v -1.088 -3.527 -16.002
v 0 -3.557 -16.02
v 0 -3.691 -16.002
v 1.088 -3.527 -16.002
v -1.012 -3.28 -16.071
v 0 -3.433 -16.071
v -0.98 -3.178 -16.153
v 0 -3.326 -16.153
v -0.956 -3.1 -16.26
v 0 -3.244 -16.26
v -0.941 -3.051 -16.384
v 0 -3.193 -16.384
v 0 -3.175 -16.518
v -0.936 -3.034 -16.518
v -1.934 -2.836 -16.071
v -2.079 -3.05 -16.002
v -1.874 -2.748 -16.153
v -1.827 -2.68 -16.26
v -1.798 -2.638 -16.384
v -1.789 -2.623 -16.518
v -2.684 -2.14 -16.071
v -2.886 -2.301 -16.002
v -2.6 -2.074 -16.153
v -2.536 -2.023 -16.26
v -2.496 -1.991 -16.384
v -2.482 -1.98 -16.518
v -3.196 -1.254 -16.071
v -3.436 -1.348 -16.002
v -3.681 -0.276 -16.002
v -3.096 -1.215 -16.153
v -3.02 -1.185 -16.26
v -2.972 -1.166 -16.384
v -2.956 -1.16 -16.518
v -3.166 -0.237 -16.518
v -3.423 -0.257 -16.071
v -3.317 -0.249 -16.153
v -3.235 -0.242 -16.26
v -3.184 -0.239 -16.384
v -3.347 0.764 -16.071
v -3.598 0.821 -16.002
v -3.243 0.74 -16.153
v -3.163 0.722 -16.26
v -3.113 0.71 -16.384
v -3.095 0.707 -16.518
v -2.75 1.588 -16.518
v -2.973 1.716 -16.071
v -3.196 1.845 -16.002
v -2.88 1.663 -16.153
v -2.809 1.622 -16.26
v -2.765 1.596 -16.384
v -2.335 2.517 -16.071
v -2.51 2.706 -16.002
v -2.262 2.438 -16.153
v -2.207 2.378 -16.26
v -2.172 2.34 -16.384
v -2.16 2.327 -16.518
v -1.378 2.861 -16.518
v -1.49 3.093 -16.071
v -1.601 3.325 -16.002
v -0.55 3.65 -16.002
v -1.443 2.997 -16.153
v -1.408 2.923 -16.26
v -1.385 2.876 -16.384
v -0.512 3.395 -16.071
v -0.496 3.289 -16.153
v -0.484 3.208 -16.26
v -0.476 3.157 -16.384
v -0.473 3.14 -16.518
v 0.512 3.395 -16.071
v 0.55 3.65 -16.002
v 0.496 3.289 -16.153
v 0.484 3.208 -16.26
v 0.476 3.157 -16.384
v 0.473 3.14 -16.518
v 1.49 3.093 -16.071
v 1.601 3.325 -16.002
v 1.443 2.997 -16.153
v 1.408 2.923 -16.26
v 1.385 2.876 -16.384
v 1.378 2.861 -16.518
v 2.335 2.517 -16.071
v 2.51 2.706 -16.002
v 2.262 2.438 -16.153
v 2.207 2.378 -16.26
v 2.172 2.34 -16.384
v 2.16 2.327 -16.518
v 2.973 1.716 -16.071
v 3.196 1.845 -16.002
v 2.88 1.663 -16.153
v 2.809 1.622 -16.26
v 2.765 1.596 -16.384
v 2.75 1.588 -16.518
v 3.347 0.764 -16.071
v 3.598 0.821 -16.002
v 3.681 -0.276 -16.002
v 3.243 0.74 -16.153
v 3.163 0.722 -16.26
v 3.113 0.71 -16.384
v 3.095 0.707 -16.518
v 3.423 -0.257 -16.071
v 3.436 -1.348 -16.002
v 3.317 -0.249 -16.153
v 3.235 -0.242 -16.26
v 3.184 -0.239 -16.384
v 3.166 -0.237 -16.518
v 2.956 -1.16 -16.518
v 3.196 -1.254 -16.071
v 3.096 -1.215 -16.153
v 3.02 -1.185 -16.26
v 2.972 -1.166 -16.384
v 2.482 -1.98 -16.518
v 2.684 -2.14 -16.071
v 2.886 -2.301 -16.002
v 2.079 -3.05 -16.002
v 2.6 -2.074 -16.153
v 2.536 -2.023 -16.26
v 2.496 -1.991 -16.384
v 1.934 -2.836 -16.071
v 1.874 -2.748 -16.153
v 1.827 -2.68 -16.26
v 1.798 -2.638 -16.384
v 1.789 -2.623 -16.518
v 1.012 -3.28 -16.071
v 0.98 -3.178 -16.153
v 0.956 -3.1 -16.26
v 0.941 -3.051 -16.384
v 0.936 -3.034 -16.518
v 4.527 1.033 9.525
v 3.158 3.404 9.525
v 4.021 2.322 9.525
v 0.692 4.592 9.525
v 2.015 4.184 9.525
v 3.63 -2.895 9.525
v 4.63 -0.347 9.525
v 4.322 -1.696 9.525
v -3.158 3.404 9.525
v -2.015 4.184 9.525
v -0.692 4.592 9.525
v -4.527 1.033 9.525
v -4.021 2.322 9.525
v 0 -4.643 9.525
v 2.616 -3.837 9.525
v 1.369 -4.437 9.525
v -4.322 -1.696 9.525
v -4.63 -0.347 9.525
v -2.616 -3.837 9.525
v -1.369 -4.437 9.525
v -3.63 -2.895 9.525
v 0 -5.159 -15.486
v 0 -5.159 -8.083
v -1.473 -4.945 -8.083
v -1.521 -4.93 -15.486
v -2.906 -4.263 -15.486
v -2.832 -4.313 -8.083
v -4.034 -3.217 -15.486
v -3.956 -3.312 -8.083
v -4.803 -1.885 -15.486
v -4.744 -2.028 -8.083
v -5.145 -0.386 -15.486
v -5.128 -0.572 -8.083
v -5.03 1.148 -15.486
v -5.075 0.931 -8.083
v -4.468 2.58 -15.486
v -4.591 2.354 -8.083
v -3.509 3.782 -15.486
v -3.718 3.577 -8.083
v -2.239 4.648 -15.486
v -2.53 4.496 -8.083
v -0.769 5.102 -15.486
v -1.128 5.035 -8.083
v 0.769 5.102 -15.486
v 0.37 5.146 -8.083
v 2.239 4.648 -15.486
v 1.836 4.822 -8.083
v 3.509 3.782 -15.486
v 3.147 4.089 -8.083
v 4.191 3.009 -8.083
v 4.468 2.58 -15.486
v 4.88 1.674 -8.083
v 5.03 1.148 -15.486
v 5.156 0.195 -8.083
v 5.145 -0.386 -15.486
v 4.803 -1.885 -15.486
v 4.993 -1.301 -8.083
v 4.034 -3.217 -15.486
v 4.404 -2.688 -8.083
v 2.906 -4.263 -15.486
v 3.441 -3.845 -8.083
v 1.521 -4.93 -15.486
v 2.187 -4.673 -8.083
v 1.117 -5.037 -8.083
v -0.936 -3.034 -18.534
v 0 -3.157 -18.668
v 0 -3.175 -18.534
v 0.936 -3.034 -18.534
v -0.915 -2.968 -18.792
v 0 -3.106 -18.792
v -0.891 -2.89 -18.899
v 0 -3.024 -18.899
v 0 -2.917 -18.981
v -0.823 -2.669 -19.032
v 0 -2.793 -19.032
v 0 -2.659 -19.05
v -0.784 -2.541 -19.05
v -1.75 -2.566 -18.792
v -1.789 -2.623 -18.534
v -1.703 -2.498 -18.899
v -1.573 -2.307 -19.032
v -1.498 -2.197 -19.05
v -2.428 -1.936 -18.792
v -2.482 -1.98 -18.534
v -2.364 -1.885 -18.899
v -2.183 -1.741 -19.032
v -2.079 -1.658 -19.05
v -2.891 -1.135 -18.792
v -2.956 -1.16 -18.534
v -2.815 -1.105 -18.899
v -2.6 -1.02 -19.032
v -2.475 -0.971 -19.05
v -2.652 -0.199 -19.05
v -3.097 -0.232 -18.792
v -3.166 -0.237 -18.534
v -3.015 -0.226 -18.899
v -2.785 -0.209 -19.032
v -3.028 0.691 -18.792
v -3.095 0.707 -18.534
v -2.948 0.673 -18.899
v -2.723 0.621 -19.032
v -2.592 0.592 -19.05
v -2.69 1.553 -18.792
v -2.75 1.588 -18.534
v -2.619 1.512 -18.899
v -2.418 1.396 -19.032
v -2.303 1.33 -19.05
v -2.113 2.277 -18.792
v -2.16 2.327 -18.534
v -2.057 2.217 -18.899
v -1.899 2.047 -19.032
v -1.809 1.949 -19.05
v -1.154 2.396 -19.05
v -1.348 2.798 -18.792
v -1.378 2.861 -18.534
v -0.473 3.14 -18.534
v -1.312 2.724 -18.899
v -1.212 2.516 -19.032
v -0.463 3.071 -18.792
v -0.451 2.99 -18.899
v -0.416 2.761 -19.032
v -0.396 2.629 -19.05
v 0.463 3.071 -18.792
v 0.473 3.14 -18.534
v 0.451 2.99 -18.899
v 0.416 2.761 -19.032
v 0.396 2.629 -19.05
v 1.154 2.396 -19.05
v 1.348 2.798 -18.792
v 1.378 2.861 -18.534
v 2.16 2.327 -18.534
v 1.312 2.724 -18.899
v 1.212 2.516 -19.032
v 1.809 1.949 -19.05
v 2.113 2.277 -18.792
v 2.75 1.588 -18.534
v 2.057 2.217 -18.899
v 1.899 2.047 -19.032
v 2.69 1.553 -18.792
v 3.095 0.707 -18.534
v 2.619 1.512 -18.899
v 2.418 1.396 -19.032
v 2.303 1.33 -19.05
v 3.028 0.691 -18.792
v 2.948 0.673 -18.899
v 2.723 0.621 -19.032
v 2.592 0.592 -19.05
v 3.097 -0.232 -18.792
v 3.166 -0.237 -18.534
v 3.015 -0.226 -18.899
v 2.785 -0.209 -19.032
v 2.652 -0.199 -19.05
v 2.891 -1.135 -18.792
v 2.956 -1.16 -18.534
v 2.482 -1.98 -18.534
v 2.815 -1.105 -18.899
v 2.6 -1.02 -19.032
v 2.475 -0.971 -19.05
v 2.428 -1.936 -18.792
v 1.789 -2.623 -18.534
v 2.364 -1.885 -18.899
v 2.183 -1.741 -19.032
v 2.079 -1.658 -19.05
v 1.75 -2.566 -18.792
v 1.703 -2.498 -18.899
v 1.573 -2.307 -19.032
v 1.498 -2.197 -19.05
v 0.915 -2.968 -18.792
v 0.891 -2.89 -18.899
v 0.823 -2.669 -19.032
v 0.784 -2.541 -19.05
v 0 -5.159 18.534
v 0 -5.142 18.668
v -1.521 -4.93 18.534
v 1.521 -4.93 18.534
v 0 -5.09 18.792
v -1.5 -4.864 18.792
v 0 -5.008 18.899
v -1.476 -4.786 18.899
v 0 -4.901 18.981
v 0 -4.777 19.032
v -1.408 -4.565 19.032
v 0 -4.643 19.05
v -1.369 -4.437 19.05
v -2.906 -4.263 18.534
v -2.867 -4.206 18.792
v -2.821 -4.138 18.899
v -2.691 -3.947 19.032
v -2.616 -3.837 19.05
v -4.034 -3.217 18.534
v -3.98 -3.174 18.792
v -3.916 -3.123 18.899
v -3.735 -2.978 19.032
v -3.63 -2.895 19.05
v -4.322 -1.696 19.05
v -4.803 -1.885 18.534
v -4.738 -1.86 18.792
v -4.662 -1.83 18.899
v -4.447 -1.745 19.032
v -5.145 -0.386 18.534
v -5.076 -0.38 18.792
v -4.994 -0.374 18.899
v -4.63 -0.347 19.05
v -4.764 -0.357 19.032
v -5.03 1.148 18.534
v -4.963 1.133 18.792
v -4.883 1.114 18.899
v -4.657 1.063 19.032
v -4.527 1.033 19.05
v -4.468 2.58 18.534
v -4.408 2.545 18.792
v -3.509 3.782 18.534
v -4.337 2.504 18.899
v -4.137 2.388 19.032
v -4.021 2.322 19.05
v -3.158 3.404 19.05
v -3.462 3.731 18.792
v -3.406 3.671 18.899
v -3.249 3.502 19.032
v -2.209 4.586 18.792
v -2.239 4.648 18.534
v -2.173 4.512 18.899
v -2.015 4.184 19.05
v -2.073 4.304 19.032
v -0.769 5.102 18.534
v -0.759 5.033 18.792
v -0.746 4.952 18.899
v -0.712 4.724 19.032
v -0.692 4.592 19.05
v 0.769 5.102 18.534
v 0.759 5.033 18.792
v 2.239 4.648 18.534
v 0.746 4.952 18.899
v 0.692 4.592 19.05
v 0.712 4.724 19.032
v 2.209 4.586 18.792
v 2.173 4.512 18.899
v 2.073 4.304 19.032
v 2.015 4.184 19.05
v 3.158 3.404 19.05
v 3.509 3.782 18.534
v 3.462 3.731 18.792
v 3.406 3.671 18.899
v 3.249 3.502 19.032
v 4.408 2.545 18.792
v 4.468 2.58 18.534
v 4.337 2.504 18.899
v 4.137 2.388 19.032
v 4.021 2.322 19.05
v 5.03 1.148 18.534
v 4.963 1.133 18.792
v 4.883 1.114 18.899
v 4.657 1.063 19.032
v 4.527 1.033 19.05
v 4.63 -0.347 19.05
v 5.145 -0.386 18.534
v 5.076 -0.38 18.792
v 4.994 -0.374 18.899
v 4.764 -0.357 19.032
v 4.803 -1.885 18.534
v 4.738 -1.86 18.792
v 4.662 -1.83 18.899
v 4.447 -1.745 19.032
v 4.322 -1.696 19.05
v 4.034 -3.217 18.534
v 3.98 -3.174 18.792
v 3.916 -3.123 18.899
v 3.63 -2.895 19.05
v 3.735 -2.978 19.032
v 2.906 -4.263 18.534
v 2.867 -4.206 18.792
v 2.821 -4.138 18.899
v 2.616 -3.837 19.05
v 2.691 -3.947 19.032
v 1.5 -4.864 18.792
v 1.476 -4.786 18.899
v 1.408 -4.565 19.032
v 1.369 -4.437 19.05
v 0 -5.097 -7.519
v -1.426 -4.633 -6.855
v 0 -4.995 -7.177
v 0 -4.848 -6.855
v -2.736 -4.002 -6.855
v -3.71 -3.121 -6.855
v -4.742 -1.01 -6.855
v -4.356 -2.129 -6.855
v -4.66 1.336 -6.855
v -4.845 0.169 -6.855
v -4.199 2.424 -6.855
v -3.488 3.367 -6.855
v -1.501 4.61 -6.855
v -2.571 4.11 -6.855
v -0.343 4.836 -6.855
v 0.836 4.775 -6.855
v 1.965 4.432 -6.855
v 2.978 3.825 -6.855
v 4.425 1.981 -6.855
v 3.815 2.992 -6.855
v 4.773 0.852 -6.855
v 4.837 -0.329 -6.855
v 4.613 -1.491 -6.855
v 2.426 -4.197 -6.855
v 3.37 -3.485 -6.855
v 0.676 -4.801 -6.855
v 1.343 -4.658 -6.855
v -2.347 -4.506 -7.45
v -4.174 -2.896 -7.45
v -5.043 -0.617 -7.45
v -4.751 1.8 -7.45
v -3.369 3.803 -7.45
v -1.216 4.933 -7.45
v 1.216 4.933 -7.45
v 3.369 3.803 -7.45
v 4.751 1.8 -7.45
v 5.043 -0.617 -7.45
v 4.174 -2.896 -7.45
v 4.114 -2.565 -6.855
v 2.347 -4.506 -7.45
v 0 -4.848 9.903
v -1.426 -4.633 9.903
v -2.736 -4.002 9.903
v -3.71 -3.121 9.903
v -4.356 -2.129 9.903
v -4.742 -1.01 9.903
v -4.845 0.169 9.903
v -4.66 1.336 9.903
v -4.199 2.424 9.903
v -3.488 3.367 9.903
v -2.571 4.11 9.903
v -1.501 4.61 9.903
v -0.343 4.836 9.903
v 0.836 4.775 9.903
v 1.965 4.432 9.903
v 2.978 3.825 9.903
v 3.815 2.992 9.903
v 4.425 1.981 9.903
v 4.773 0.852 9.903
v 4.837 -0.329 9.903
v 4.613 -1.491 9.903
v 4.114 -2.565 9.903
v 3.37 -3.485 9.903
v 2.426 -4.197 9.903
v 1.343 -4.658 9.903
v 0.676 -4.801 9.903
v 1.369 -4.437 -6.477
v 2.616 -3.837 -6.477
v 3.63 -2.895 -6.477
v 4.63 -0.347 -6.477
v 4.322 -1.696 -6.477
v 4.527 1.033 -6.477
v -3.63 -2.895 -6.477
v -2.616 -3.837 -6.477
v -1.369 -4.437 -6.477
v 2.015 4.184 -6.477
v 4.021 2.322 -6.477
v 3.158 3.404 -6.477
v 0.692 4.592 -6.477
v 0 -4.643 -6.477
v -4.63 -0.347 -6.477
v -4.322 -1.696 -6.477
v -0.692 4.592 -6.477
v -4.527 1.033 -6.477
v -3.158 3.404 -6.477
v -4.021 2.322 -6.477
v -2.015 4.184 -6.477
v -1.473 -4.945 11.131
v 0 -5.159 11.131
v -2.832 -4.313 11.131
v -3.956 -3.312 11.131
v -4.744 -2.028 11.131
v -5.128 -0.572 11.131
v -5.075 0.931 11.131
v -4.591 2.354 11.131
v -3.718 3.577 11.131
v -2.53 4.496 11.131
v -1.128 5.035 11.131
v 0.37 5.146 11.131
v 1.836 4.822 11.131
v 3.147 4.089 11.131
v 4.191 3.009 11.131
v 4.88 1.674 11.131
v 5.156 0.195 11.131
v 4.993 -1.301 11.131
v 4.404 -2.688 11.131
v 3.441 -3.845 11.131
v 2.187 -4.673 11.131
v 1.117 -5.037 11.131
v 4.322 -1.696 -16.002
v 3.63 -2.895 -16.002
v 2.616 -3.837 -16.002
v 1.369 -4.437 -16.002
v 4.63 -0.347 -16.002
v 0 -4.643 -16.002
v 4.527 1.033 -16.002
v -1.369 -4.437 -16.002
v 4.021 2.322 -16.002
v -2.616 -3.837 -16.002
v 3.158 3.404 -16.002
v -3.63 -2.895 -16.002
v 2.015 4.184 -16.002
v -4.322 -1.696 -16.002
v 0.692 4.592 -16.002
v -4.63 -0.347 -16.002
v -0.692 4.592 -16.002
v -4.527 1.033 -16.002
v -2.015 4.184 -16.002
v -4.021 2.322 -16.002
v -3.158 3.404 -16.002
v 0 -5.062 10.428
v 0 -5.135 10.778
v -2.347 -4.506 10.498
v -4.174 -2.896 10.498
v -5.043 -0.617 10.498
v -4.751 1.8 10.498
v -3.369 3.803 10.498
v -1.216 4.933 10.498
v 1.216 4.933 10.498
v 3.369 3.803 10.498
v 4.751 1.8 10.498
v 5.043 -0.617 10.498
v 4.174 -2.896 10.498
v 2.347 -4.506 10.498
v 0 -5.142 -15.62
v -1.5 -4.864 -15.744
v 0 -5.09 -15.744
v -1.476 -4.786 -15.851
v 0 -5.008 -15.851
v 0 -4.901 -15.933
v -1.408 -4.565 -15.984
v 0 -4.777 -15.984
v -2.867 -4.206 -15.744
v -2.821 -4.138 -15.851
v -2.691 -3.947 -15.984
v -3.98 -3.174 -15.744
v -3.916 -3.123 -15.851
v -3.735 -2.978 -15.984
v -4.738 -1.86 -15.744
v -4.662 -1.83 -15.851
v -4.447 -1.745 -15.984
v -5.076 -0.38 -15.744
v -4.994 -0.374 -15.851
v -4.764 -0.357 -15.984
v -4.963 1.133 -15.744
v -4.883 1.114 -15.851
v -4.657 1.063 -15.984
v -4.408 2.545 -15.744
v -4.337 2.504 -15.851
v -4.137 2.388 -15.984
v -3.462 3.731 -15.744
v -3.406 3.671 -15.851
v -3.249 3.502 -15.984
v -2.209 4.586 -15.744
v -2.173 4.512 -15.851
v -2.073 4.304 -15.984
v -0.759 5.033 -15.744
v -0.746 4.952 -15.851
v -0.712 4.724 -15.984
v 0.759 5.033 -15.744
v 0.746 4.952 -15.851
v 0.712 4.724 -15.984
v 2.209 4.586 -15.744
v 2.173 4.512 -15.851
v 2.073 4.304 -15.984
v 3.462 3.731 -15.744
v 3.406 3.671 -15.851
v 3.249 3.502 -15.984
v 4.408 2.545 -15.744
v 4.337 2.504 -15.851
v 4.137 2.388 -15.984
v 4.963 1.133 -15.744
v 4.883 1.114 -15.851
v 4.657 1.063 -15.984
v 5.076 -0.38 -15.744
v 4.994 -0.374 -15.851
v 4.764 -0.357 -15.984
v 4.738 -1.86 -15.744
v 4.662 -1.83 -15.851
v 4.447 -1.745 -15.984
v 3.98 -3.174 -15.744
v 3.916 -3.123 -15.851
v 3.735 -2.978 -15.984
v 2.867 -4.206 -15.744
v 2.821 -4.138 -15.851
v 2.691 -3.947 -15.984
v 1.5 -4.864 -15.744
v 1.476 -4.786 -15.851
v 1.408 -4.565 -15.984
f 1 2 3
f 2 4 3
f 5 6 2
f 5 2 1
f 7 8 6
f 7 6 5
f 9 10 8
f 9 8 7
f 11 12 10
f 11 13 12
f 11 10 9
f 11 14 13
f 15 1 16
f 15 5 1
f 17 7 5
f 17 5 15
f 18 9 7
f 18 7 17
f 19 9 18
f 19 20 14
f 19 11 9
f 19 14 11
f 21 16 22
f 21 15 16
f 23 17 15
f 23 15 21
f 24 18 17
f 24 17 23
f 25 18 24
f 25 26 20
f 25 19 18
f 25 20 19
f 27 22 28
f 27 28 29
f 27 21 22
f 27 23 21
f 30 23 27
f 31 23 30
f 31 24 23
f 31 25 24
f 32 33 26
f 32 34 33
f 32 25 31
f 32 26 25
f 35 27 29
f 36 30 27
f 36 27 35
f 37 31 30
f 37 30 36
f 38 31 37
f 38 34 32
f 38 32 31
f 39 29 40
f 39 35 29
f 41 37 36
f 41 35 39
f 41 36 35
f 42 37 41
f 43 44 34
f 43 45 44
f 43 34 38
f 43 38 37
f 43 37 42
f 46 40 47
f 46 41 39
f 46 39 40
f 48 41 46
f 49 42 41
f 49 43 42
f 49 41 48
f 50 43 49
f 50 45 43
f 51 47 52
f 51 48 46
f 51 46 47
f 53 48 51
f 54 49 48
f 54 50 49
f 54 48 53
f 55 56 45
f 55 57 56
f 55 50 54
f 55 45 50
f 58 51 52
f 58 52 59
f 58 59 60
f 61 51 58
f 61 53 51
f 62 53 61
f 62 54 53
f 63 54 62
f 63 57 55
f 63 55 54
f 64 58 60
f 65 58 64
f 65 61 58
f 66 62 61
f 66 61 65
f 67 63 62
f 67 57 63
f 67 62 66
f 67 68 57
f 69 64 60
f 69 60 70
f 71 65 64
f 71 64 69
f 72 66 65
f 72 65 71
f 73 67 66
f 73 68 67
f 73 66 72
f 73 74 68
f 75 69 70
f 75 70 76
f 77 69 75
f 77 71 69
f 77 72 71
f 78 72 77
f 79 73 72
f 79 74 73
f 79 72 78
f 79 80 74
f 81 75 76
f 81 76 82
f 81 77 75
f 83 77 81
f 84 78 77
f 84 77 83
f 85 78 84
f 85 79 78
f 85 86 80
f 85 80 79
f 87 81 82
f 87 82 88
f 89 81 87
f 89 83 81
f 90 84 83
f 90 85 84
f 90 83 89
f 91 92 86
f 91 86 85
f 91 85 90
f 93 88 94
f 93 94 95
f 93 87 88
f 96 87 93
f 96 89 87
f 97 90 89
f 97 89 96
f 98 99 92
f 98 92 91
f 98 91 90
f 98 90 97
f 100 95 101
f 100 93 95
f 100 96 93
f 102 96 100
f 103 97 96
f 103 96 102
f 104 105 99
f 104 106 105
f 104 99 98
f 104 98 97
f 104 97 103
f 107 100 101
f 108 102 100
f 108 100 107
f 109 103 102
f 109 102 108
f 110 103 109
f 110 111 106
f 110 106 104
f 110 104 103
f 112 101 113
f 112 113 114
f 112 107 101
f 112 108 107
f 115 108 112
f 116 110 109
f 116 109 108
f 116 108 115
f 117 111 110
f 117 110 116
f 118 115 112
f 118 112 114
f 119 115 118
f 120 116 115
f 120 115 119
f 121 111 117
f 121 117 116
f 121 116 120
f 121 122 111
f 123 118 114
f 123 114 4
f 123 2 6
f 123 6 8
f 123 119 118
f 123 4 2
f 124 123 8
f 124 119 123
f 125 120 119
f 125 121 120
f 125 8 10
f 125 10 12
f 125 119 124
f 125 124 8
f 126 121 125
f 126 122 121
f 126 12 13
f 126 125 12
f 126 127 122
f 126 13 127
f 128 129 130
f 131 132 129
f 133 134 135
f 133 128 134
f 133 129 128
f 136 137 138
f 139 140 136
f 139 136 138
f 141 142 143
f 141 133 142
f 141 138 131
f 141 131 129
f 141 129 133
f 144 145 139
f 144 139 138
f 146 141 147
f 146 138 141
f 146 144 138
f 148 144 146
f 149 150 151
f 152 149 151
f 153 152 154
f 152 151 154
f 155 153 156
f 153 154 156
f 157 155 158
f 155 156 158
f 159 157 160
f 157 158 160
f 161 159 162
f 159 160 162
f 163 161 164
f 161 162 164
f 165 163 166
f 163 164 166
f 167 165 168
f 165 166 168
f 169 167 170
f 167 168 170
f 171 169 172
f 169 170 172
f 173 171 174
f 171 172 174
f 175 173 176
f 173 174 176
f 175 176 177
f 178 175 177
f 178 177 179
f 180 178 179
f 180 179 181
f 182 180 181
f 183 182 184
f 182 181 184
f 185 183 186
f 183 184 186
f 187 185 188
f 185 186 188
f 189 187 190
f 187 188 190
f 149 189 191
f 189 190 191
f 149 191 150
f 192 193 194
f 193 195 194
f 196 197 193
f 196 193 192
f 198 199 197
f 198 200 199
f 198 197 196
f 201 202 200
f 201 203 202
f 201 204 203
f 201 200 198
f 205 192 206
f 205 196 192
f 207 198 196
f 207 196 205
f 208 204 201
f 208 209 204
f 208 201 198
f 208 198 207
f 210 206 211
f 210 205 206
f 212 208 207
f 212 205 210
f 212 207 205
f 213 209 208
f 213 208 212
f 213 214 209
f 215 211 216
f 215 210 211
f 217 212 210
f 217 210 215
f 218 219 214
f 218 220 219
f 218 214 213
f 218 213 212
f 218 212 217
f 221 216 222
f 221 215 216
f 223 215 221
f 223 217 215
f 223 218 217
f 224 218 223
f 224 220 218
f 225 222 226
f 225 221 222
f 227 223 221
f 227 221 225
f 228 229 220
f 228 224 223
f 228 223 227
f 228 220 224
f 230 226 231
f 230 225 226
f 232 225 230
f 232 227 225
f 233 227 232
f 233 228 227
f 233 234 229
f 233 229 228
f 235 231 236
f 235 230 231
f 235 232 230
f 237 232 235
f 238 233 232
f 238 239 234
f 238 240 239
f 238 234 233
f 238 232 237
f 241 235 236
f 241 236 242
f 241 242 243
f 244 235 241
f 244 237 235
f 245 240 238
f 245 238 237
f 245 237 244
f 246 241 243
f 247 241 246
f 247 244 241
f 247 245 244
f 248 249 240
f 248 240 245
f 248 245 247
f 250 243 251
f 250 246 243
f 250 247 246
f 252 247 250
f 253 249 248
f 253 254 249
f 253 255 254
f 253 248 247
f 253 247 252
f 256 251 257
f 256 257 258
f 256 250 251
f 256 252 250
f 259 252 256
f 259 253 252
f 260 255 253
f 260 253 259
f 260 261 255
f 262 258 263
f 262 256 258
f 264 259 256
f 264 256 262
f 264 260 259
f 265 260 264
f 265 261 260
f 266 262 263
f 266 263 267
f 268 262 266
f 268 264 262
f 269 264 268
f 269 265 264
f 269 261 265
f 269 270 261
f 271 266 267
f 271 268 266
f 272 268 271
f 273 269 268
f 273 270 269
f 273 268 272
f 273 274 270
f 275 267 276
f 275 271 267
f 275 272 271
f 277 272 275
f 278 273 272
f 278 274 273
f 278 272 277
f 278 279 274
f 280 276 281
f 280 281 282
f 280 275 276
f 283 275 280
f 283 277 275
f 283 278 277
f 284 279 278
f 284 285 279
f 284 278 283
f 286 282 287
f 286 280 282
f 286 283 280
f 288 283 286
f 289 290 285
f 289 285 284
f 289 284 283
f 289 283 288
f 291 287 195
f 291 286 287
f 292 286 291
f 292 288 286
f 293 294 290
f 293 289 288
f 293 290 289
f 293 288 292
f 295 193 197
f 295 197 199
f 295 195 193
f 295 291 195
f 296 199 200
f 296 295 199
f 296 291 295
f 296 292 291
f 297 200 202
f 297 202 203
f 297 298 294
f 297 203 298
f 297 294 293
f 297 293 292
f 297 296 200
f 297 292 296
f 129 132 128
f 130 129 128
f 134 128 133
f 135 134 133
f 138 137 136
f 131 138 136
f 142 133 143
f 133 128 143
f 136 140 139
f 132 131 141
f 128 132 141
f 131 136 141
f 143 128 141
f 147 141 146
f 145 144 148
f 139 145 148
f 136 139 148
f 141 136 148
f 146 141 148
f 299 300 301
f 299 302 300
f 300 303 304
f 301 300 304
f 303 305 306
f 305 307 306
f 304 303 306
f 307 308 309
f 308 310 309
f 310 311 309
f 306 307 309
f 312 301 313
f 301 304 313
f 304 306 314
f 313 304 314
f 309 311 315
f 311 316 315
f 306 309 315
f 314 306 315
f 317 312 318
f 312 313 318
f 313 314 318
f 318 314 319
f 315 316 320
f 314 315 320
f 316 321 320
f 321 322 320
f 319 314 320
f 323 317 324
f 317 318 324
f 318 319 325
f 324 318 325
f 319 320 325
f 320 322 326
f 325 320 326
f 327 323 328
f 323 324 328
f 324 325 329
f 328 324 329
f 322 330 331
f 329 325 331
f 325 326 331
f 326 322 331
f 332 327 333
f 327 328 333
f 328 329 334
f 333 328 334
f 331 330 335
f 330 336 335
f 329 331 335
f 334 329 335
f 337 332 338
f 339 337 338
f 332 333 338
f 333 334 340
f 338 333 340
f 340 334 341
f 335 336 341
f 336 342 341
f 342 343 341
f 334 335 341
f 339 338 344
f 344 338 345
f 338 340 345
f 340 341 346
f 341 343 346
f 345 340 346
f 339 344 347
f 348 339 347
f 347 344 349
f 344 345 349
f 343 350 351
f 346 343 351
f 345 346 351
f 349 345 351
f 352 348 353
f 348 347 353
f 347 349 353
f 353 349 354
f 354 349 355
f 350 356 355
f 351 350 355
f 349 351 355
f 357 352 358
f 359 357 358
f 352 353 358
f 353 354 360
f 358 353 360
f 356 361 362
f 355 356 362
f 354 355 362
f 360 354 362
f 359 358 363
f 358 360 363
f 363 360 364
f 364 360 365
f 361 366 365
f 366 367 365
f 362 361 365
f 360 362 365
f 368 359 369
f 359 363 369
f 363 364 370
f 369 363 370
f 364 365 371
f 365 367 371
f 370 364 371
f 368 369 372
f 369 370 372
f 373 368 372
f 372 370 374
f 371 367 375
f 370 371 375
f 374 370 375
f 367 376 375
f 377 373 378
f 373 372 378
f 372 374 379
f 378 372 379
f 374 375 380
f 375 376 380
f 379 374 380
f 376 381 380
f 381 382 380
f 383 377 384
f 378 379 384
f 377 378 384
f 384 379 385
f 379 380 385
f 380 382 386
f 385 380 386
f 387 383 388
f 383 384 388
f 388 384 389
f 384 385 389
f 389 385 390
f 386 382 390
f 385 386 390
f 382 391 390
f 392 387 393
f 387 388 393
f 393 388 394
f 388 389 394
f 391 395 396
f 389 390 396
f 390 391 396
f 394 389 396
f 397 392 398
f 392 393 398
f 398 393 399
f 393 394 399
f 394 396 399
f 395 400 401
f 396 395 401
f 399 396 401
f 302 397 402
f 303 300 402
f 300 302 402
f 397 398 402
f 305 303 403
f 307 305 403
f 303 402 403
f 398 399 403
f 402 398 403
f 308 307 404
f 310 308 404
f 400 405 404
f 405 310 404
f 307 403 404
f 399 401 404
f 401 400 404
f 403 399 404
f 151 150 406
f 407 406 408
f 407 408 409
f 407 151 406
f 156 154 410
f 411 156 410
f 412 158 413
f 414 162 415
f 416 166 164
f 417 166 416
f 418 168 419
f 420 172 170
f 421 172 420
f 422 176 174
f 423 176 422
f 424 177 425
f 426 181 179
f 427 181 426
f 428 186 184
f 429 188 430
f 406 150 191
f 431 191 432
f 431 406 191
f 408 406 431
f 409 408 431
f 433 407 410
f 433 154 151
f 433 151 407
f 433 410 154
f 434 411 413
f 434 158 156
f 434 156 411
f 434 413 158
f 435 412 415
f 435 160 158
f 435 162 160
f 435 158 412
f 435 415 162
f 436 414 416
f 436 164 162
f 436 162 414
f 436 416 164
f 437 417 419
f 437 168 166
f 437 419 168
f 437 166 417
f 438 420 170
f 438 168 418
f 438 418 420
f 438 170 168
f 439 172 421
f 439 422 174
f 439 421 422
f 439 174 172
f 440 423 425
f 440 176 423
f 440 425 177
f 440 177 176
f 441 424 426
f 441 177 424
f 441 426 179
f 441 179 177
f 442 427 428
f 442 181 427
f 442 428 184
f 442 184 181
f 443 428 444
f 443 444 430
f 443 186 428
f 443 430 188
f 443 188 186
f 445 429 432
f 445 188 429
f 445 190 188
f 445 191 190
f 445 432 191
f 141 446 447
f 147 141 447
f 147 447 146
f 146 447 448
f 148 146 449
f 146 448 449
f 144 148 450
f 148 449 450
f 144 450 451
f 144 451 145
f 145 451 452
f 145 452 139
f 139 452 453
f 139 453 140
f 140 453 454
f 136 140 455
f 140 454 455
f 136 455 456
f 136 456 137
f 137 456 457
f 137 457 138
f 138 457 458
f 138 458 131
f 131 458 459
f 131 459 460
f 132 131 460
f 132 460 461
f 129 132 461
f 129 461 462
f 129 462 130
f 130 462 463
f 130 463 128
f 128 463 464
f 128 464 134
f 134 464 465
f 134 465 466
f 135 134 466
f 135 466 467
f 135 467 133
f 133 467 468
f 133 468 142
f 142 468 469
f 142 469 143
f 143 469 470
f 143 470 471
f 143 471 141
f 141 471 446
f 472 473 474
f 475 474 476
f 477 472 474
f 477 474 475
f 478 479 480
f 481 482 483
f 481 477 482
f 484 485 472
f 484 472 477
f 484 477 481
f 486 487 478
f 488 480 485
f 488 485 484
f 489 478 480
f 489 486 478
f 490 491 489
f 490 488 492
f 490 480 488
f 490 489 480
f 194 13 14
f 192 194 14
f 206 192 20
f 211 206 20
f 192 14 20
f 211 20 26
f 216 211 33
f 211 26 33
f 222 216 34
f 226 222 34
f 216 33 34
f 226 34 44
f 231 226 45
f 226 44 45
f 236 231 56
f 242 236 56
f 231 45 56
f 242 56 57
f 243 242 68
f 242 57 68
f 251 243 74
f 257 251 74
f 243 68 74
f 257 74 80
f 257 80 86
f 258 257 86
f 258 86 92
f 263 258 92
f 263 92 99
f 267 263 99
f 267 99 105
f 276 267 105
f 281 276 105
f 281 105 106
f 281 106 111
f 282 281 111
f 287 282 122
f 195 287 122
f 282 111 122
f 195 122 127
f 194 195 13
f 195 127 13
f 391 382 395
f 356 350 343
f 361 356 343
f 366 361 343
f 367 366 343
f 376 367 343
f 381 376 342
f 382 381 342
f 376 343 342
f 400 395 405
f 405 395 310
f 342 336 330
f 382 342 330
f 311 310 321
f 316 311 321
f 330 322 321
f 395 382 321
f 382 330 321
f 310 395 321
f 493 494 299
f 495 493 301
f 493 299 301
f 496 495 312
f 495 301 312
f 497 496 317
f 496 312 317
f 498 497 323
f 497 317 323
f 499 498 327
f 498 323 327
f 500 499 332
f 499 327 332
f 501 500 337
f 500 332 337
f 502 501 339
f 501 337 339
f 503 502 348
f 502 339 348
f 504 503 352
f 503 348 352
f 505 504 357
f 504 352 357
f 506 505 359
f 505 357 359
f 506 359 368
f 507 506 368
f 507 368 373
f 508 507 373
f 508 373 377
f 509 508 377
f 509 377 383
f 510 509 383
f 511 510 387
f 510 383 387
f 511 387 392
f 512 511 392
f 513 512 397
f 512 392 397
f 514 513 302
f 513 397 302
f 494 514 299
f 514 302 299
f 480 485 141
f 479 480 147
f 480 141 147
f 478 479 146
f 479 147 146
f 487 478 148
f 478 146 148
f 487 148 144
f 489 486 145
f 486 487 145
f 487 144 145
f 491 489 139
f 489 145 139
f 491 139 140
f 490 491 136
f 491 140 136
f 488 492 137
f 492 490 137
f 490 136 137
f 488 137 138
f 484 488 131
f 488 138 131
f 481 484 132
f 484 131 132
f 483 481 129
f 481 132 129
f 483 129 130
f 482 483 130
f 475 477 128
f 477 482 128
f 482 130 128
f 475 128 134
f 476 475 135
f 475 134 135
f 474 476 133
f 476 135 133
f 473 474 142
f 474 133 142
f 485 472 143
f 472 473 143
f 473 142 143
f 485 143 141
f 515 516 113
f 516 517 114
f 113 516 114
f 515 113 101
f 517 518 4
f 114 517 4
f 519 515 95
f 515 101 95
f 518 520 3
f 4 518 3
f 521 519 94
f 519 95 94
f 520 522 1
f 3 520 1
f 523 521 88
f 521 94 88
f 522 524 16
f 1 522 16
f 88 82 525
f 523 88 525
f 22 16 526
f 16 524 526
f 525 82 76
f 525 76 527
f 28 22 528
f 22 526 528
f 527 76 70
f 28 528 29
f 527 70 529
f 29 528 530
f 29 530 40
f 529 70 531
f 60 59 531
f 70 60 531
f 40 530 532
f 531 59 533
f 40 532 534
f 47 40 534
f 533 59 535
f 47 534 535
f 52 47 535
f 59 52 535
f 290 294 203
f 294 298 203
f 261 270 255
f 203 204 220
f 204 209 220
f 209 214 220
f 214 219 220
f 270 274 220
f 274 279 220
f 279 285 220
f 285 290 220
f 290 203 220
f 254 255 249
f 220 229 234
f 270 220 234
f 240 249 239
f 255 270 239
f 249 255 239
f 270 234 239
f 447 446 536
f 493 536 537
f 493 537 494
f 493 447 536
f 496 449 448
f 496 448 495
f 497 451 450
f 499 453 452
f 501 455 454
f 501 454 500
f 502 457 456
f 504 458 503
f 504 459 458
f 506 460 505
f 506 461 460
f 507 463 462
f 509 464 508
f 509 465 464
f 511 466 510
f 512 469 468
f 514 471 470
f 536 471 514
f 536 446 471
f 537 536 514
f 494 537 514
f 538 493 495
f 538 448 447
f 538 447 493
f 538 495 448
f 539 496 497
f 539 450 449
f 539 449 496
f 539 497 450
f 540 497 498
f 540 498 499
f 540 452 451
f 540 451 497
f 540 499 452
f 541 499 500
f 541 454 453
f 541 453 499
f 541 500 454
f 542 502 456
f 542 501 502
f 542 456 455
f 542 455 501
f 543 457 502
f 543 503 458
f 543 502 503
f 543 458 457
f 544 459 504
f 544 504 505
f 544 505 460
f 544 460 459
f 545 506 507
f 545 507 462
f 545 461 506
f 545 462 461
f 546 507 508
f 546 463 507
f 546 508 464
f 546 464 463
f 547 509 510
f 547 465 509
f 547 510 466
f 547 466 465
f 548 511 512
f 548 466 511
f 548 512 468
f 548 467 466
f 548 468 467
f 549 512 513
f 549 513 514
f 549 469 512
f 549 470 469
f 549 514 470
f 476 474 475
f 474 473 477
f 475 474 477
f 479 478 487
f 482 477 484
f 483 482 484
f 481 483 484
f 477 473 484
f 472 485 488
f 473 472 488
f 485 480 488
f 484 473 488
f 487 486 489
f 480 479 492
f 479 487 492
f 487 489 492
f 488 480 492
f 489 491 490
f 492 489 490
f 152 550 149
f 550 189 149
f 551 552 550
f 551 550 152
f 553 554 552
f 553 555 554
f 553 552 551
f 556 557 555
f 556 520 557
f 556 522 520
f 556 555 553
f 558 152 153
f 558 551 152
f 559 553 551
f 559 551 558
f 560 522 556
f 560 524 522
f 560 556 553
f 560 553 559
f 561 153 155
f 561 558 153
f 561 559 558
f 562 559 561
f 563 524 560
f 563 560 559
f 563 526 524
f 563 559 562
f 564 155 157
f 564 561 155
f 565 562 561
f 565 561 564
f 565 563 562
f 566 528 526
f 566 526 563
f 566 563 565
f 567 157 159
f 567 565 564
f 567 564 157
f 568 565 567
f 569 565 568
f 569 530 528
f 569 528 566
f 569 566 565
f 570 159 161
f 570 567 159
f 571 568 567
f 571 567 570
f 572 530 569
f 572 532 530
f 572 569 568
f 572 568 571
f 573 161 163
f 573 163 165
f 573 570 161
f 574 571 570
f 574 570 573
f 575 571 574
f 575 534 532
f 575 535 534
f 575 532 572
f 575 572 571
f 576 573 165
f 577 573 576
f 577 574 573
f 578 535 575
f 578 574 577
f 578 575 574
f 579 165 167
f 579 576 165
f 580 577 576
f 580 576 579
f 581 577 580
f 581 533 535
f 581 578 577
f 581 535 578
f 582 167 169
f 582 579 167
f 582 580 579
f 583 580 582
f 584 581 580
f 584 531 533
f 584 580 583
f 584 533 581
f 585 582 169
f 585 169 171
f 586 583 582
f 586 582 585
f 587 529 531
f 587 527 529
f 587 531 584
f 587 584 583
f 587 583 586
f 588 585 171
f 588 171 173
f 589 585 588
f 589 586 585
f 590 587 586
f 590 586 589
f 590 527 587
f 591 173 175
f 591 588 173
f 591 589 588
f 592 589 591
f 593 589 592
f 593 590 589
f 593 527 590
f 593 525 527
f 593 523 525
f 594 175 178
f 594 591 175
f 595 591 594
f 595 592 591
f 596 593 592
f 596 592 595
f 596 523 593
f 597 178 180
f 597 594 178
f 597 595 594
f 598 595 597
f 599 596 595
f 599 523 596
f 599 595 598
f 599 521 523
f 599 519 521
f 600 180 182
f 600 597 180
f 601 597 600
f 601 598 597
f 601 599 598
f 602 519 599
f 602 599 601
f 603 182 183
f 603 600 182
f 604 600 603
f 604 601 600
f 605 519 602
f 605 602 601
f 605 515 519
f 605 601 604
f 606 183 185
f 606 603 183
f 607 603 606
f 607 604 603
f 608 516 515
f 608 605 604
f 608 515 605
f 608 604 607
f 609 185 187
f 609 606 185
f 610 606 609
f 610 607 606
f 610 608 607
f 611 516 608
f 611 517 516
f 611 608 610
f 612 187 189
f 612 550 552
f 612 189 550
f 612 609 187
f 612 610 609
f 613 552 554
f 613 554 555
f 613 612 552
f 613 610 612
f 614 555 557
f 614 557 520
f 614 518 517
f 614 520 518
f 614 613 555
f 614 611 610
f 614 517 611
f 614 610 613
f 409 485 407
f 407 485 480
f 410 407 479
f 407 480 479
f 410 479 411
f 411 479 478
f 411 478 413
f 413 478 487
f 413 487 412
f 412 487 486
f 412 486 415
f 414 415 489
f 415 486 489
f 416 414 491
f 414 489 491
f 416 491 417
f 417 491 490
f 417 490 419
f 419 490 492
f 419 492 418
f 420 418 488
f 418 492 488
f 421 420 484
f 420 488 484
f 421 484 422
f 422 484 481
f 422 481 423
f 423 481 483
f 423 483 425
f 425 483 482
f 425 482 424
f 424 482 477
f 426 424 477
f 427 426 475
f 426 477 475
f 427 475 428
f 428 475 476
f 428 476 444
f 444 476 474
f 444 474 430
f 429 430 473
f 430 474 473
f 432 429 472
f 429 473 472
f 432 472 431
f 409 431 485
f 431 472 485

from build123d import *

# Parameters (mm, degrees)
FILLET2_R              = 2.5796875
FILLET1_R              = 0.5159375
SPLIT1_SURFACE_1_BACK  = 41.799
SPLIT1_SURFACE_1_DEPTH = 83.598
SPLIT1_SURFACE_2_BACK  = 41.799
SPLIT1_SURFACE_2_DEPTH = 83.598


with BuildPart() as part:
    # Sketch2 → Revolve1 (revolve)
    with BuildSketch(Plane(origin=(0, 0, 0), x_dir=(0, 0, -1), z_dir=(1, 0, 0)), mode=Mode.PRIVATE) as revolve1_sk:
        Polygon((-19.05, 5.159375), (-19.05, 0), (19.05, 0), (19.05, 3.175), (16.002, 3.175), (16.002, 5.159375), (7.4295, 5.159375), (6.477, 4.6434375), (-9.525, 4.6434375), (-10.4775, 5.159375), align=None)
    revolve(revolve1_sk.sketch.rotate(Axis((0, 0, 19.05), (0, 0, -1)), 180), axis=Axis((0, 0, 19.05), (0, 0, -1)))

    # Fillet2
    fillet2_edges = [part.edges().sort_by_distance(p)[0] for p in [
        (0, 5.159375, 10.4775),
        (0, 5.159375, -7.4295),
    ]]
    fillet(fillet2_edges, radius=FILLET2_R)

    # Fillet1
    fillet1_edges = [part.edges().sort_by_distance(p)[0] for p in [
        (0, 5.159375, 19.05),
        (0, 5.159375, -16.002),
        (0, 3.175, -16.002),
        (0, 3.175, -19.05),
    ]]
    fillet(fillet1_edges, radius=FILLET1_R)


with BuildPart() as body_2:
    # Split1: the piece behind the surface
    add(part.part)
    # Split1 surface: a surface, the sketch's curves swept straight by 83.598 mm
    with BuildLine(Plane(origin=(0, 0, 0), x_dir=(0, 0, -1), z_dir=(1, 0, 0)).offset(-SPLIT1_SURFACE_1_BACK), mode=Mode.PRIVATE) as split1_surface_1_path:
        Line((-9.525, 4.6434375), (-9.525, -4.6434375))
        Line((-9.525, -4.6434375), (6.477, -4.6434375))
        Line((6.477, -4.6434375), (6.477, 4.6434375))
    split1_surface_1 = Shell.extrude(split1_surface_1_path.wire(), (1 * SPLIT1_SURFACE_1_DEPTH, 0 * SPLIT1_SURFACE_1_DEPTH, 0 * SPLIT1_SURFACE_1_DEPTH))
    split(bisect_by=split1_surface_1, keep=Keep.BOTTOM)


with BuildPart() as part_1:
    add(part.part)

    # Split1: split by a surface, the side it looks to stays
    # Split1 surface: a surface, the sketch's curves swept straight by 83.598 mm
    with BuildLine(Plane(origin=(0, 0, 0), x_dir=(0, 0, -1), z_dir=(1, 0, 0)).offset(-SPLIT1_SURFACE_2_BACK), mode=Mode.PRIVATE) as split1_surface_2_path:
        Line((-9.525, 4.6434375), (-9.525, -4.6434375))
        Line((-9.525, -4.6434375), (6.477, -4.6434375))
        Line((6.477, -4.6434375), (6.477, 4.6434375))
    split1_surface_2 = Shell.extrude(split1_surface_2_path.wire(), (1 * SPLIT1_SURFACE_2_DEPTH, 0 * SPLIT1_SURFACE_2_DEPTH, 0 * SPLIT1_SURFACE_2_DEPTH))
    split(bisect_by=split1_surface_2, keep=Keep.TOP)


solid = Compound([body_2.part, part_1.part])
